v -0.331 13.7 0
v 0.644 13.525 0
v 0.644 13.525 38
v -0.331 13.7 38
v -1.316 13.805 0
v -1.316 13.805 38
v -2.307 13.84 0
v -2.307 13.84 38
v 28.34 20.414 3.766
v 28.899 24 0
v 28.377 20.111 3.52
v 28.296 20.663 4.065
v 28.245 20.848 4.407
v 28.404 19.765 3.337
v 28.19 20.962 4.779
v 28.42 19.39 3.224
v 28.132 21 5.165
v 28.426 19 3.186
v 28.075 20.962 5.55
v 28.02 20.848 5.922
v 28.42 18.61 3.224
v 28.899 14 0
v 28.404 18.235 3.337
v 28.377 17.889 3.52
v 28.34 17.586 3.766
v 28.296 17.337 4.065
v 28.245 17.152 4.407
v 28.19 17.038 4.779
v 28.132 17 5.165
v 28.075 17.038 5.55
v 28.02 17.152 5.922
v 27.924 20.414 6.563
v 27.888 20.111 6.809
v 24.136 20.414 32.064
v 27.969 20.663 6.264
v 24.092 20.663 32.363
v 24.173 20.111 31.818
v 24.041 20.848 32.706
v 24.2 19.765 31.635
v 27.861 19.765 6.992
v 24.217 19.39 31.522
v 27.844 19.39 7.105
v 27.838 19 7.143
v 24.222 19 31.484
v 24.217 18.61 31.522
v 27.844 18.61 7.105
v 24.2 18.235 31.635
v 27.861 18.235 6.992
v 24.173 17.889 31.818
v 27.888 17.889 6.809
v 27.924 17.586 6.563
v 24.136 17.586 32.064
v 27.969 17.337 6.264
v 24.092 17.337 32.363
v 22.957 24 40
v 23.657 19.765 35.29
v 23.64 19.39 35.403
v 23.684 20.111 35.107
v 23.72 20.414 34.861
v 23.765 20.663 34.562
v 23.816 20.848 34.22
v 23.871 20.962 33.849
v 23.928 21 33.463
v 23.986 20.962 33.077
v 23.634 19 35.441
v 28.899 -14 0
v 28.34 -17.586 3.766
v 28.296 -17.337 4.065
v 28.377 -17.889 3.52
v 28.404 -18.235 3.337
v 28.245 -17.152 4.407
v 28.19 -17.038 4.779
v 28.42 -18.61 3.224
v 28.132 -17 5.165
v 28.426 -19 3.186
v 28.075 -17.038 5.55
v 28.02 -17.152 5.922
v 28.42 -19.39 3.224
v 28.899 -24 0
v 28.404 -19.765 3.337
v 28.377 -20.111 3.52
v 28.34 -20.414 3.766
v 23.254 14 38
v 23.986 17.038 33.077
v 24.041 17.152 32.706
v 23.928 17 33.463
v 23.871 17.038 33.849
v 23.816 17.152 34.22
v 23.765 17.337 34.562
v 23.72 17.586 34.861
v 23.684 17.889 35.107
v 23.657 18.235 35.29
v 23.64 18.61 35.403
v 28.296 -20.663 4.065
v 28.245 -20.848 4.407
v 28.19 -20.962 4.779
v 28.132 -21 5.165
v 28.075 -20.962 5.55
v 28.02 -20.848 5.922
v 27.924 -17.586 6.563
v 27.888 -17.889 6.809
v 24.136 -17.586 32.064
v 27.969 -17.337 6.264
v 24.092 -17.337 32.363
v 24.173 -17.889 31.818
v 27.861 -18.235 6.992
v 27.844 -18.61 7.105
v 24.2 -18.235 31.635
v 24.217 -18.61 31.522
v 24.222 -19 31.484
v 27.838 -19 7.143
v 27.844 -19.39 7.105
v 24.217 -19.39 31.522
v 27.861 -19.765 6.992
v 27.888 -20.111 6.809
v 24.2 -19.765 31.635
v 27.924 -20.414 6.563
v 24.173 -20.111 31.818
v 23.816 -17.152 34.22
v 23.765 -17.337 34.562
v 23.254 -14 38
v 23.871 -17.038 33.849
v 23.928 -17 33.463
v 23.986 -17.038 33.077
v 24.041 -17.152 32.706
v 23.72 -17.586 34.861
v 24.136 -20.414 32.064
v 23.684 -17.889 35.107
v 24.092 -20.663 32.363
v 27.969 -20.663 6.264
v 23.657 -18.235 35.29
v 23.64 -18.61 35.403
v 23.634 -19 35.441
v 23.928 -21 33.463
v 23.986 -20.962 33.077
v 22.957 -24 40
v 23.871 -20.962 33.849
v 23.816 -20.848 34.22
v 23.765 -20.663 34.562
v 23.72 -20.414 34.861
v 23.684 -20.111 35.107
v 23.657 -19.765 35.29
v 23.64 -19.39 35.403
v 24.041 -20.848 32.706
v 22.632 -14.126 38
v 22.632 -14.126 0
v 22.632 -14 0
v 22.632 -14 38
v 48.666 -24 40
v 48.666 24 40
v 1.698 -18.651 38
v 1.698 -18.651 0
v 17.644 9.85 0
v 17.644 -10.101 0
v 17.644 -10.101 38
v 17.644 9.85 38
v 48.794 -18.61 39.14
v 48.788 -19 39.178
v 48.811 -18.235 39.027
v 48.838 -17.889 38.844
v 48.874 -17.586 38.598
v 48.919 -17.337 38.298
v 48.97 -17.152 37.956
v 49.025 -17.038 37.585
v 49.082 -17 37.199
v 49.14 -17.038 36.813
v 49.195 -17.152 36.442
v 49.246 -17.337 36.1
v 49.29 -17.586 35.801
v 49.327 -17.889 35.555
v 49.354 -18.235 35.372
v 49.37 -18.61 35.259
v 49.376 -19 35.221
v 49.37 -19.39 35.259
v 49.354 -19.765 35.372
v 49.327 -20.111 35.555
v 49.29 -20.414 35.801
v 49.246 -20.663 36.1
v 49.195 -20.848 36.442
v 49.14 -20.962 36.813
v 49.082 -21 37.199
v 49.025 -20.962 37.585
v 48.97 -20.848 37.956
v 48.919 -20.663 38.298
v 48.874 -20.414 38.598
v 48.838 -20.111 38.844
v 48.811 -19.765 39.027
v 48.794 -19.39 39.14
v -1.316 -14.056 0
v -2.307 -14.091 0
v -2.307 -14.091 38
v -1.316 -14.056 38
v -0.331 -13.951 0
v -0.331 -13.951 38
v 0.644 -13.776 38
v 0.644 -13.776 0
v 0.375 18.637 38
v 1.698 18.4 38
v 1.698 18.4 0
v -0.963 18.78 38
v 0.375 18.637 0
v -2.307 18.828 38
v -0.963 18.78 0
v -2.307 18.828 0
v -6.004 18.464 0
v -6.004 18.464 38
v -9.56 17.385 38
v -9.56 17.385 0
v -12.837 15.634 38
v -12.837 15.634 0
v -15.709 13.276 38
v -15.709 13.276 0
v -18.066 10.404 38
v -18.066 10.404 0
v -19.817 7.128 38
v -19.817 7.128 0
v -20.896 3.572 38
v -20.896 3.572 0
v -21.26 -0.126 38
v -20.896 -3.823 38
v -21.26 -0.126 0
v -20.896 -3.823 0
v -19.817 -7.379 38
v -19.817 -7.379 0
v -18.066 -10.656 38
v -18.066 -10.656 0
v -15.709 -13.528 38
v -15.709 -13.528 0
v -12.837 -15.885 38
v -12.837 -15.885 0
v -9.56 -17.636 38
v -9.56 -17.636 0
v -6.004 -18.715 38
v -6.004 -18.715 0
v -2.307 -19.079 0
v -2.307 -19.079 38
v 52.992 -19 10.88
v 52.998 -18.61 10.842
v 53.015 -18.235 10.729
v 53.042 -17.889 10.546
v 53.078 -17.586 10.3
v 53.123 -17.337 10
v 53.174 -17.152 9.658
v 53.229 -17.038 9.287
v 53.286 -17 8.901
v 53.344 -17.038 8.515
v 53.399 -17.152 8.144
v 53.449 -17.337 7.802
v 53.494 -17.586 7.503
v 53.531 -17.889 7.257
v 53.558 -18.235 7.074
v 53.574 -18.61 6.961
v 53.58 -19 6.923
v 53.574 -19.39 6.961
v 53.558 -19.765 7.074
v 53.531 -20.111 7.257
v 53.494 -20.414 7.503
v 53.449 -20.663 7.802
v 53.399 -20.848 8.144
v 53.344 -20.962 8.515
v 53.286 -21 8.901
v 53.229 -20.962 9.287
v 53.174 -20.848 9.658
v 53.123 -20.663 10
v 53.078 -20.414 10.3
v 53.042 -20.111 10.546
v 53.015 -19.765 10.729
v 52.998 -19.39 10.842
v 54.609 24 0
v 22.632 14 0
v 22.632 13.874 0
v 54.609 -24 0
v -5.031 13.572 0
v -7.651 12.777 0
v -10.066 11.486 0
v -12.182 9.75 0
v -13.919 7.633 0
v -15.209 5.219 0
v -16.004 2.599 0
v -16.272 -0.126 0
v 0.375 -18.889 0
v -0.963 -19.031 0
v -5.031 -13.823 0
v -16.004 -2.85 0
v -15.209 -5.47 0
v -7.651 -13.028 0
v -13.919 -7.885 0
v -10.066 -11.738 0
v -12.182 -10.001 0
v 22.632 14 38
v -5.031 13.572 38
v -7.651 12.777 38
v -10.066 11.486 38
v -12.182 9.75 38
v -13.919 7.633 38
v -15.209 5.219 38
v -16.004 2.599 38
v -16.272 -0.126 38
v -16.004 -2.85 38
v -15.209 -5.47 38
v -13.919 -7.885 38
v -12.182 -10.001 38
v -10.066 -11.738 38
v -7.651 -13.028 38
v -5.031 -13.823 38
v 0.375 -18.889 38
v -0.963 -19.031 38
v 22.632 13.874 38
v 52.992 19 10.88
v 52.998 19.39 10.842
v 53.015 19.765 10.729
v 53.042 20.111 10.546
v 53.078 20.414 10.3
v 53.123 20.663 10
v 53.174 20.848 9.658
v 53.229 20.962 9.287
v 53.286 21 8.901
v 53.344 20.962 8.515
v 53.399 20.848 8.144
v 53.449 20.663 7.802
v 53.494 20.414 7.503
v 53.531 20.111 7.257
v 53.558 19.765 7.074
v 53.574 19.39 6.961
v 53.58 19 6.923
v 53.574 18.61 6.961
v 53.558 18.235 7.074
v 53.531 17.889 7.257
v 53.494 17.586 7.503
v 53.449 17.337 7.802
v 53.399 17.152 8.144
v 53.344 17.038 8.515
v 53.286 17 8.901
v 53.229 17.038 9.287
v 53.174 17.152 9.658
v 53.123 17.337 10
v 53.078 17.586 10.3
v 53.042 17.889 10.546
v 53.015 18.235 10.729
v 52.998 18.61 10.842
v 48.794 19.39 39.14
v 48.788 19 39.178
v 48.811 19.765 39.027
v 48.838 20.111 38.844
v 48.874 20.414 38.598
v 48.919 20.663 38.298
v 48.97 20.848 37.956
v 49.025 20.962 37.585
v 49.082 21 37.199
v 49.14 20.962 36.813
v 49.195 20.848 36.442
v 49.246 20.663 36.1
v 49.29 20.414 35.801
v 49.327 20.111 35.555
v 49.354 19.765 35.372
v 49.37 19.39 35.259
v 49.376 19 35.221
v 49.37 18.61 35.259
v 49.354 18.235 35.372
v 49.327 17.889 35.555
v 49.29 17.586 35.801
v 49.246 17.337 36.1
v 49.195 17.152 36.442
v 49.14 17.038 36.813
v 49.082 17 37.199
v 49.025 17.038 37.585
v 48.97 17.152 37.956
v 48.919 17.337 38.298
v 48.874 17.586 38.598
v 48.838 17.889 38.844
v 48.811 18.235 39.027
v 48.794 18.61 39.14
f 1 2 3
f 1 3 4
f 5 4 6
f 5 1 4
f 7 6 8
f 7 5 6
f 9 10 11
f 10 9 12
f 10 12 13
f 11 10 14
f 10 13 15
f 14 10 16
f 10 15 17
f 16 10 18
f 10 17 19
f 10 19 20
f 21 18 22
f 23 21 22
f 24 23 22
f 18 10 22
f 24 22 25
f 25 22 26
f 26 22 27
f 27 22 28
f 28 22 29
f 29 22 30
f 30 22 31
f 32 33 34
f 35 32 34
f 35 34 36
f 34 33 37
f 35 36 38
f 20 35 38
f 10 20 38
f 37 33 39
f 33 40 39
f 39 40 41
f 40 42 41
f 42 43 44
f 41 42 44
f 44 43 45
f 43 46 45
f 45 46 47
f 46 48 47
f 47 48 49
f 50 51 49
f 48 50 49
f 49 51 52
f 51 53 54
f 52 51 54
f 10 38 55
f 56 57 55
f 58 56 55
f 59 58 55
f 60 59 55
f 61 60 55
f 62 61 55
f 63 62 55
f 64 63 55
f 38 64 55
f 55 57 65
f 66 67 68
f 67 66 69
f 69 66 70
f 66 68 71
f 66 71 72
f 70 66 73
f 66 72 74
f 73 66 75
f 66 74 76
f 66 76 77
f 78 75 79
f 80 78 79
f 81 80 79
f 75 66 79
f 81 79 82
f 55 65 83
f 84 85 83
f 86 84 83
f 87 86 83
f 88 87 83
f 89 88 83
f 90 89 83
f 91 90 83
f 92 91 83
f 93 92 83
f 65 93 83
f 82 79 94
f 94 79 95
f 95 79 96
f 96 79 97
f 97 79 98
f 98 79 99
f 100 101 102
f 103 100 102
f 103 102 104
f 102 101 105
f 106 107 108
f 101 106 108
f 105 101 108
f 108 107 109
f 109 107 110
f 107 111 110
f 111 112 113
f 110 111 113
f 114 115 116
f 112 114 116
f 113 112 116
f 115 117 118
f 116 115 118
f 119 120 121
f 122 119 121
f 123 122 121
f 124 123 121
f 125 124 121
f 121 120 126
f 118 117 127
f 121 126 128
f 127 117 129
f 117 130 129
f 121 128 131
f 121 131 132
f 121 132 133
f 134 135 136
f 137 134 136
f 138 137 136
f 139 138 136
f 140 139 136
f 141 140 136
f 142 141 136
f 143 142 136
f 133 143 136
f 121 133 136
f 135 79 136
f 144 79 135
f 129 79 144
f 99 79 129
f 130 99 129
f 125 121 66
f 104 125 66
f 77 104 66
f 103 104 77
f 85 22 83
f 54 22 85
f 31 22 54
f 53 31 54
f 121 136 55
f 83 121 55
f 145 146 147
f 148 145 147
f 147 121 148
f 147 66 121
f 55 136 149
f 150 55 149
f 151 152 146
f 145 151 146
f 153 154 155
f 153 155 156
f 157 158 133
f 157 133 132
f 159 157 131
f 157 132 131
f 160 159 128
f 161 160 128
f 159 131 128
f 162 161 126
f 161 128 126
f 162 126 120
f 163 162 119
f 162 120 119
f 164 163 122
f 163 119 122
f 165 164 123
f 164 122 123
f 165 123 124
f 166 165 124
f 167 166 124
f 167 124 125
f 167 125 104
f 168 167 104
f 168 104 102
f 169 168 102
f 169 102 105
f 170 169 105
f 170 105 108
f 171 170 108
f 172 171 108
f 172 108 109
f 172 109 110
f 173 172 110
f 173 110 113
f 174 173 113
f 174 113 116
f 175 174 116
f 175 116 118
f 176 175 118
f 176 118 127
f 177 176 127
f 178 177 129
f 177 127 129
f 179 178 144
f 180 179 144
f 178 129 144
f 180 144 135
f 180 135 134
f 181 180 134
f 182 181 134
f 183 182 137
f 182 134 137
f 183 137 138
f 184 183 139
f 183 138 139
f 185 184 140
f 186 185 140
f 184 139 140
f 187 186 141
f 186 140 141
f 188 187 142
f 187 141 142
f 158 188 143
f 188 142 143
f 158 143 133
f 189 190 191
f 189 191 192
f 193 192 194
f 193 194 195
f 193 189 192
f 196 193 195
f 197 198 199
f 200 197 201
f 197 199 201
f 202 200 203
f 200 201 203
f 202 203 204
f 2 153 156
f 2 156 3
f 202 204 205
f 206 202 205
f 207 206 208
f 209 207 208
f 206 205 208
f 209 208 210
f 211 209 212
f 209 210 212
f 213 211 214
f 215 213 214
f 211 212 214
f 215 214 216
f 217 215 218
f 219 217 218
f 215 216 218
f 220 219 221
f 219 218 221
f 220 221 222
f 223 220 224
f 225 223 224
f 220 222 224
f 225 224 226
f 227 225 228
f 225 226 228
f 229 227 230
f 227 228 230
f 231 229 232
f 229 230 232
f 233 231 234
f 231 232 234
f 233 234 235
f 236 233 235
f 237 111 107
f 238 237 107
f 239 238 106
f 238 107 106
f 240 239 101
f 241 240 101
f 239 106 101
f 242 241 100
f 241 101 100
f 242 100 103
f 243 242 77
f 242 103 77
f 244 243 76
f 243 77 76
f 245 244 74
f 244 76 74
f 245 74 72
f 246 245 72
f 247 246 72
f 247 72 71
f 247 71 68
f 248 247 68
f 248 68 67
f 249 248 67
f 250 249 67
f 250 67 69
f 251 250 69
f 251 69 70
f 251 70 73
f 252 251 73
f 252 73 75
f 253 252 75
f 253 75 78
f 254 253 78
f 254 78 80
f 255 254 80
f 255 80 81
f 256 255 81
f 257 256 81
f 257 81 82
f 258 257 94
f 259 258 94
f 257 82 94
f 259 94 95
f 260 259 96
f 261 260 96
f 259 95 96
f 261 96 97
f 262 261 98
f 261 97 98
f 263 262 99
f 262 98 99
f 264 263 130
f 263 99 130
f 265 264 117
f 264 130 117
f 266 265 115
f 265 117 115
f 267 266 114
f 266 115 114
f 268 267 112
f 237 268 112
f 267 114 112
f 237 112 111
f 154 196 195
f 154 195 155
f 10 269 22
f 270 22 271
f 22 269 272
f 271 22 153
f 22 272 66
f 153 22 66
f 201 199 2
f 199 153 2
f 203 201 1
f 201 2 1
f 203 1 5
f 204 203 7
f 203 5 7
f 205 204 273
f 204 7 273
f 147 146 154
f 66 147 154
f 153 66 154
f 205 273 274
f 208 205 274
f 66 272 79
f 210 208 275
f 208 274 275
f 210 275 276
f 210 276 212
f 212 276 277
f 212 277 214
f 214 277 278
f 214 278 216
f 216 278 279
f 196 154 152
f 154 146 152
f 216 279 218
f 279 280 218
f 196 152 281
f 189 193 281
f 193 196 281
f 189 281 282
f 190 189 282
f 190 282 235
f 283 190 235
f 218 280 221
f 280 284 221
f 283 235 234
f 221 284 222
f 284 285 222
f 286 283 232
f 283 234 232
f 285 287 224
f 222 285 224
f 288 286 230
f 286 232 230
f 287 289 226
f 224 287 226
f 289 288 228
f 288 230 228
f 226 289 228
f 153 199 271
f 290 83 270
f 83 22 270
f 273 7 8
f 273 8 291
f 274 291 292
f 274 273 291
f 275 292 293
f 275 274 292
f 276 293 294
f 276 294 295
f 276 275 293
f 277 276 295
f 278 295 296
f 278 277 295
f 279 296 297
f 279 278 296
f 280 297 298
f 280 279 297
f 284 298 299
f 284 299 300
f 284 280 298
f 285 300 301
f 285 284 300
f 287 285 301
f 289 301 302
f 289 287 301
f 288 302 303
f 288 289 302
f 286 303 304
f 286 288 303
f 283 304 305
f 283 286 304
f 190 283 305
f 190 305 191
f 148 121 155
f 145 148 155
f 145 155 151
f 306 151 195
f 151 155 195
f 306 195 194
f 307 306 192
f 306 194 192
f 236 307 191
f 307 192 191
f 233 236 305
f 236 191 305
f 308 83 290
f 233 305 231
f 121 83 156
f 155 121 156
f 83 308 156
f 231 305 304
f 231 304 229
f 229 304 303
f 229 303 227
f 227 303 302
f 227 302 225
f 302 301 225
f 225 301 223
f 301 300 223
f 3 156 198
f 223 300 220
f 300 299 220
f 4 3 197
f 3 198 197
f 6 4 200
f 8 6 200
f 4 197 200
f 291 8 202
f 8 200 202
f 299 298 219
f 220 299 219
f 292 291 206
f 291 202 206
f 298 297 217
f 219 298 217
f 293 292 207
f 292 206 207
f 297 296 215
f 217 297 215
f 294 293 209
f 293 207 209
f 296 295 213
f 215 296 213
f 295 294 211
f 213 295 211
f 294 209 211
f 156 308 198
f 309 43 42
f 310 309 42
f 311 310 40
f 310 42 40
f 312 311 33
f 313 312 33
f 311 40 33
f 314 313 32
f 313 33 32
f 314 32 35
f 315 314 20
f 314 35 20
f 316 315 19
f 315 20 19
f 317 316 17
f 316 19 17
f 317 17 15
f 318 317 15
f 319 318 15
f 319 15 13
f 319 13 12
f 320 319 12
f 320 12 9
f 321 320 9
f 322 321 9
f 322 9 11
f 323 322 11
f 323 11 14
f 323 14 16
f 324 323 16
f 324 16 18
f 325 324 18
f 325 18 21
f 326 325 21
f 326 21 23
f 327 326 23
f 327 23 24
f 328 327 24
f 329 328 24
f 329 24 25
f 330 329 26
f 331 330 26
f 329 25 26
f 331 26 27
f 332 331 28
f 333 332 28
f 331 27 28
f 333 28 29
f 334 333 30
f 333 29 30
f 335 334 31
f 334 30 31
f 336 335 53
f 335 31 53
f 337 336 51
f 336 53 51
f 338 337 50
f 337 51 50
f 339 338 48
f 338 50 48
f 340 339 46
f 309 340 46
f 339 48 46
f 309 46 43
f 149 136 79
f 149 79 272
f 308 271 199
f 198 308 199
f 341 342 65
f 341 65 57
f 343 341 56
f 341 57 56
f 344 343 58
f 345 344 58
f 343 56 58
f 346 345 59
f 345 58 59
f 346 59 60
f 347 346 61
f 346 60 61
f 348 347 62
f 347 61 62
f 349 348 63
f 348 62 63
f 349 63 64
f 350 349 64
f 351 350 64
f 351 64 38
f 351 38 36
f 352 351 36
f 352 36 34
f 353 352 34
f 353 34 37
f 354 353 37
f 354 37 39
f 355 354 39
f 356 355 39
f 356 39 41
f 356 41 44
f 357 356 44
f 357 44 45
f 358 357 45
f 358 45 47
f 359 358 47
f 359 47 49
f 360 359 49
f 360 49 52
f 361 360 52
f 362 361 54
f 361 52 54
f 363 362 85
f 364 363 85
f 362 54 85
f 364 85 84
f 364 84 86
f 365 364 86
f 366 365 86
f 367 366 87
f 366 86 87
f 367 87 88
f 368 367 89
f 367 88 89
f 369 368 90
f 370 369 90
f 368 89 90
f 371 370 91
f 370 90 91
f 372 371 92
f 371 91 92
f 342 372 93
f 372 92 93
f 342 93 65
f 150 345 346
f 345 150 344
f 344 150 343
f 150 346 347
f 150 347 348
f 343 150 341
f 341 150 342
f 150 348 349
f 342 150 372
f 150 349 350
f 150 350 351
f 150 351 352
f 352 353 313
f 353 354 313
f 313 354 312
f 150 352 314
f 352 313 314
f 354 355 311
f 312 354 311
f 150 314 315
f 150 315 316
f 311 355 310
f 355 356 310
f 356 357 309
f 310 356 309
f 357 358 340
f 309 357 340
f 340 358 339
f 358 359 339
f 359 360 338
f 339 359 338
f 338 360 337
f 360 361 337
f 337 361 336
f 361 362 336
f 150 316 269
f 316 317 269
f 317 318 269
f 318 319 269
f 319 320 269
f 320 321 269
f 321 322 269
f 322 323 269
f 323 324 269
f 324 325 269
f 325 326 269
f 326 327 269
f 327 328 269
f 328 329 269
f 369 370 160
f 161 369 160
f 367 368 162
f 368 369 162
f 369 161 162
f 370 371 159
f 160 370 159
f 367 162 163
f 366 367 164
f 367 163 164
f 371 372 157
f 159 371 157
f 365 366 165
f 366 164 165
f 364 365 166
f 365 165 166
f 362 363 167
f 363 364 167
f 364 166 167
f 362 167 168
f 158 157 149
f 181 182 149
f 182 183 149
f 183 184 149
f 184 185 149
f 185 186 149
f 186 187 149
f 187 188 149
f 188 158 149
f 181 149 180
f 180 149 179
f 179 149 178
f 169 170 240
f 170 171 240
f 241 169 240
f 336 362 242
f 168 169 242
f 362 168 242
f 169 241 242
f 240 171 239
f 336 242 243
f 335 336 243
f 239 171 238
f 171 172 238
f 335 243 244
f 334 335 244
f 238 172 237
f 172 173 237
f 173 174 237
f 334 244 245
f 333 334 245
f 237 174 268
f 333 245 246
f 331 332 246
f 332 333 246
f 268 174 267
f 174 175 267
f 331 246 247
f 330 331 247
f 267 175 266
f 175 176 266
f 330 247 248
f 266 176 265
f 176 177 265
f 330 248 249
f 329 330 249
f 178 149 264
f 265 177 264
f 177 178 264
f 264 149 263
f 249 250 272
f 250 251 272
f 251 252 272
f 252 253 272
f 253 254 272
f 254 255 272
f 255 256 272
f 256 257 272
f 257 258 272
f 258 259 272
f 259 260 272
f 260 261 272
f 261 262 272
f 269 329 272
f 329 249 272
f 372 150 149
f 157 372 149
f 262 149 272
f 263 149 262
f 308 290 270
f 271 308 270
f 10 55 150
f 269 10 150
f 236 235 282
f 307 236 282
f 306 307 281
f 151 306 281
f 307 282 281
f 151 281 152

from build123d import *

# Parameters (mm, degrees)
BOSS_EXTRUDE1_DEPTH      = 38
BOSS_EXTRUDE2_DEPTH      = 14
BOSS_EXTRUDE5_DEPTH      = 10
BOSS_EXTRUDE5_DEPTH_BACK = 38
SKETCH6_R                = 2
CUT_EXTRUDE2_DEPTH       = 36


with BuildPart() as part:
    # Sketch1 → Boss-Extrude1 (new body)
    with BuildSketch(Plane.XY):
        with BuildLine():
            Line((22.631743337, -14.12565234), (22.631743337, 13.87434766))
            Line((22.631743337, 13.87434766), (1.698298535, 18.39987252))
            ThreePointArc((1.698298535, 18.39987252), (-0.292783652, 18.720543399), (-2.306666921, 18.827838622))
            ThreePointArc((-2.306666921, 18.827838622), (-21.260157884, -0.12565234), (-2.306666921, -19.079143303))
            ThreePointArc((-2.306666921, -19.079143303), (-0.292783652, -18.971848079), (1.698298535, -18.651177201))
            Line((1.698298535, -18.651177201), (22.631743337, -14.12565234))
        make_face()
        with BuildLine():
            Line((17.644061285, -10.101016443), (17.644061285, 9.849711763))
            Line((17.644061285, 9.849711763), (0.644376893, 13.52481135))
            ThreePointArc((0.644376893, 13.52481135), (-0.822744568, 13.761096487), (-2.306666921, 13.840156571))
            ThreePointArc((-2.306666921, 13.840156571), (-16.272475832, -0.12565234), (-2.306666921, -14.091461251))
            ThreePointArc((-2.306666921, -14.091461251), (-0.822744568, -14.012401167), (0.644376893, -13.77611603))
            Line((0.644376893, -13.77611603), (17.644061285, -10.101016443))
        make_face(mode=Mode.SUBTRACT)
    extrude(amount=BOSS_EXTRUDE1_DEPTH)

    # Sketch2 → Boss-Extrude2 (add, symmetric)
    with BuildSketch(Plane(origin=(0, 0, 0), x_dir=(1, 0, 0), z_dir=(0, 1, 0))):
        Polygon((22.631743337, -38), (22.631743337, 0), (48.276983868, 0), (42.631743337, -38), align=None)
    extrude(amount=BOSS_EXTRUDE2_DEPTH, both=True)

    # Sketch4 → Boss-Extrude5 (add, two sides: drawn at the far end of the back side and taken through both)
    with BuildSketch(Plane(origin=(0, 14, 0), x_dir=(1, 0, 0), z_dir=(0, 1, 0)).offset(-BOSS_EXTRUDE5_DEPTH_BACK)):
        Polygon((28.899463429, 0), (22.957104975, -40), (48.666190602, -40), (54.608549056, 0), align=None)
    extrude(amount=BOSS_EXTRUDE5_DEPTH + BOSS_EXTRUDE5_DEPTH_BACK)

    # Sketch6 → Cut-Extrude2 (cut)
    with BuildSketch(Plane(origin=(28.275431305, 0, 4.200568706), x_dir=(-0.14694627579900546, 0, 0.9891444748007253), z_dir=(-0.9891444748007252, 0, -0.14694627579900543))):
        with Locations((0.974565013, 19)):
            Circle(SKETCH6_R)
        with Locations((29.583142195, 19)):
            Circle(SKETCH6_R)
        with Locations((0.974565013, -19)):
            Circle(SKETCH6_R)
        with Locations((29.583142195, -19)):
            Circle(SKETCH6_R)
    extrude(amount=-CUT_EXTRUDE2_DEPTH, mode=Mode.SUBTRACT)


solid = part.part
